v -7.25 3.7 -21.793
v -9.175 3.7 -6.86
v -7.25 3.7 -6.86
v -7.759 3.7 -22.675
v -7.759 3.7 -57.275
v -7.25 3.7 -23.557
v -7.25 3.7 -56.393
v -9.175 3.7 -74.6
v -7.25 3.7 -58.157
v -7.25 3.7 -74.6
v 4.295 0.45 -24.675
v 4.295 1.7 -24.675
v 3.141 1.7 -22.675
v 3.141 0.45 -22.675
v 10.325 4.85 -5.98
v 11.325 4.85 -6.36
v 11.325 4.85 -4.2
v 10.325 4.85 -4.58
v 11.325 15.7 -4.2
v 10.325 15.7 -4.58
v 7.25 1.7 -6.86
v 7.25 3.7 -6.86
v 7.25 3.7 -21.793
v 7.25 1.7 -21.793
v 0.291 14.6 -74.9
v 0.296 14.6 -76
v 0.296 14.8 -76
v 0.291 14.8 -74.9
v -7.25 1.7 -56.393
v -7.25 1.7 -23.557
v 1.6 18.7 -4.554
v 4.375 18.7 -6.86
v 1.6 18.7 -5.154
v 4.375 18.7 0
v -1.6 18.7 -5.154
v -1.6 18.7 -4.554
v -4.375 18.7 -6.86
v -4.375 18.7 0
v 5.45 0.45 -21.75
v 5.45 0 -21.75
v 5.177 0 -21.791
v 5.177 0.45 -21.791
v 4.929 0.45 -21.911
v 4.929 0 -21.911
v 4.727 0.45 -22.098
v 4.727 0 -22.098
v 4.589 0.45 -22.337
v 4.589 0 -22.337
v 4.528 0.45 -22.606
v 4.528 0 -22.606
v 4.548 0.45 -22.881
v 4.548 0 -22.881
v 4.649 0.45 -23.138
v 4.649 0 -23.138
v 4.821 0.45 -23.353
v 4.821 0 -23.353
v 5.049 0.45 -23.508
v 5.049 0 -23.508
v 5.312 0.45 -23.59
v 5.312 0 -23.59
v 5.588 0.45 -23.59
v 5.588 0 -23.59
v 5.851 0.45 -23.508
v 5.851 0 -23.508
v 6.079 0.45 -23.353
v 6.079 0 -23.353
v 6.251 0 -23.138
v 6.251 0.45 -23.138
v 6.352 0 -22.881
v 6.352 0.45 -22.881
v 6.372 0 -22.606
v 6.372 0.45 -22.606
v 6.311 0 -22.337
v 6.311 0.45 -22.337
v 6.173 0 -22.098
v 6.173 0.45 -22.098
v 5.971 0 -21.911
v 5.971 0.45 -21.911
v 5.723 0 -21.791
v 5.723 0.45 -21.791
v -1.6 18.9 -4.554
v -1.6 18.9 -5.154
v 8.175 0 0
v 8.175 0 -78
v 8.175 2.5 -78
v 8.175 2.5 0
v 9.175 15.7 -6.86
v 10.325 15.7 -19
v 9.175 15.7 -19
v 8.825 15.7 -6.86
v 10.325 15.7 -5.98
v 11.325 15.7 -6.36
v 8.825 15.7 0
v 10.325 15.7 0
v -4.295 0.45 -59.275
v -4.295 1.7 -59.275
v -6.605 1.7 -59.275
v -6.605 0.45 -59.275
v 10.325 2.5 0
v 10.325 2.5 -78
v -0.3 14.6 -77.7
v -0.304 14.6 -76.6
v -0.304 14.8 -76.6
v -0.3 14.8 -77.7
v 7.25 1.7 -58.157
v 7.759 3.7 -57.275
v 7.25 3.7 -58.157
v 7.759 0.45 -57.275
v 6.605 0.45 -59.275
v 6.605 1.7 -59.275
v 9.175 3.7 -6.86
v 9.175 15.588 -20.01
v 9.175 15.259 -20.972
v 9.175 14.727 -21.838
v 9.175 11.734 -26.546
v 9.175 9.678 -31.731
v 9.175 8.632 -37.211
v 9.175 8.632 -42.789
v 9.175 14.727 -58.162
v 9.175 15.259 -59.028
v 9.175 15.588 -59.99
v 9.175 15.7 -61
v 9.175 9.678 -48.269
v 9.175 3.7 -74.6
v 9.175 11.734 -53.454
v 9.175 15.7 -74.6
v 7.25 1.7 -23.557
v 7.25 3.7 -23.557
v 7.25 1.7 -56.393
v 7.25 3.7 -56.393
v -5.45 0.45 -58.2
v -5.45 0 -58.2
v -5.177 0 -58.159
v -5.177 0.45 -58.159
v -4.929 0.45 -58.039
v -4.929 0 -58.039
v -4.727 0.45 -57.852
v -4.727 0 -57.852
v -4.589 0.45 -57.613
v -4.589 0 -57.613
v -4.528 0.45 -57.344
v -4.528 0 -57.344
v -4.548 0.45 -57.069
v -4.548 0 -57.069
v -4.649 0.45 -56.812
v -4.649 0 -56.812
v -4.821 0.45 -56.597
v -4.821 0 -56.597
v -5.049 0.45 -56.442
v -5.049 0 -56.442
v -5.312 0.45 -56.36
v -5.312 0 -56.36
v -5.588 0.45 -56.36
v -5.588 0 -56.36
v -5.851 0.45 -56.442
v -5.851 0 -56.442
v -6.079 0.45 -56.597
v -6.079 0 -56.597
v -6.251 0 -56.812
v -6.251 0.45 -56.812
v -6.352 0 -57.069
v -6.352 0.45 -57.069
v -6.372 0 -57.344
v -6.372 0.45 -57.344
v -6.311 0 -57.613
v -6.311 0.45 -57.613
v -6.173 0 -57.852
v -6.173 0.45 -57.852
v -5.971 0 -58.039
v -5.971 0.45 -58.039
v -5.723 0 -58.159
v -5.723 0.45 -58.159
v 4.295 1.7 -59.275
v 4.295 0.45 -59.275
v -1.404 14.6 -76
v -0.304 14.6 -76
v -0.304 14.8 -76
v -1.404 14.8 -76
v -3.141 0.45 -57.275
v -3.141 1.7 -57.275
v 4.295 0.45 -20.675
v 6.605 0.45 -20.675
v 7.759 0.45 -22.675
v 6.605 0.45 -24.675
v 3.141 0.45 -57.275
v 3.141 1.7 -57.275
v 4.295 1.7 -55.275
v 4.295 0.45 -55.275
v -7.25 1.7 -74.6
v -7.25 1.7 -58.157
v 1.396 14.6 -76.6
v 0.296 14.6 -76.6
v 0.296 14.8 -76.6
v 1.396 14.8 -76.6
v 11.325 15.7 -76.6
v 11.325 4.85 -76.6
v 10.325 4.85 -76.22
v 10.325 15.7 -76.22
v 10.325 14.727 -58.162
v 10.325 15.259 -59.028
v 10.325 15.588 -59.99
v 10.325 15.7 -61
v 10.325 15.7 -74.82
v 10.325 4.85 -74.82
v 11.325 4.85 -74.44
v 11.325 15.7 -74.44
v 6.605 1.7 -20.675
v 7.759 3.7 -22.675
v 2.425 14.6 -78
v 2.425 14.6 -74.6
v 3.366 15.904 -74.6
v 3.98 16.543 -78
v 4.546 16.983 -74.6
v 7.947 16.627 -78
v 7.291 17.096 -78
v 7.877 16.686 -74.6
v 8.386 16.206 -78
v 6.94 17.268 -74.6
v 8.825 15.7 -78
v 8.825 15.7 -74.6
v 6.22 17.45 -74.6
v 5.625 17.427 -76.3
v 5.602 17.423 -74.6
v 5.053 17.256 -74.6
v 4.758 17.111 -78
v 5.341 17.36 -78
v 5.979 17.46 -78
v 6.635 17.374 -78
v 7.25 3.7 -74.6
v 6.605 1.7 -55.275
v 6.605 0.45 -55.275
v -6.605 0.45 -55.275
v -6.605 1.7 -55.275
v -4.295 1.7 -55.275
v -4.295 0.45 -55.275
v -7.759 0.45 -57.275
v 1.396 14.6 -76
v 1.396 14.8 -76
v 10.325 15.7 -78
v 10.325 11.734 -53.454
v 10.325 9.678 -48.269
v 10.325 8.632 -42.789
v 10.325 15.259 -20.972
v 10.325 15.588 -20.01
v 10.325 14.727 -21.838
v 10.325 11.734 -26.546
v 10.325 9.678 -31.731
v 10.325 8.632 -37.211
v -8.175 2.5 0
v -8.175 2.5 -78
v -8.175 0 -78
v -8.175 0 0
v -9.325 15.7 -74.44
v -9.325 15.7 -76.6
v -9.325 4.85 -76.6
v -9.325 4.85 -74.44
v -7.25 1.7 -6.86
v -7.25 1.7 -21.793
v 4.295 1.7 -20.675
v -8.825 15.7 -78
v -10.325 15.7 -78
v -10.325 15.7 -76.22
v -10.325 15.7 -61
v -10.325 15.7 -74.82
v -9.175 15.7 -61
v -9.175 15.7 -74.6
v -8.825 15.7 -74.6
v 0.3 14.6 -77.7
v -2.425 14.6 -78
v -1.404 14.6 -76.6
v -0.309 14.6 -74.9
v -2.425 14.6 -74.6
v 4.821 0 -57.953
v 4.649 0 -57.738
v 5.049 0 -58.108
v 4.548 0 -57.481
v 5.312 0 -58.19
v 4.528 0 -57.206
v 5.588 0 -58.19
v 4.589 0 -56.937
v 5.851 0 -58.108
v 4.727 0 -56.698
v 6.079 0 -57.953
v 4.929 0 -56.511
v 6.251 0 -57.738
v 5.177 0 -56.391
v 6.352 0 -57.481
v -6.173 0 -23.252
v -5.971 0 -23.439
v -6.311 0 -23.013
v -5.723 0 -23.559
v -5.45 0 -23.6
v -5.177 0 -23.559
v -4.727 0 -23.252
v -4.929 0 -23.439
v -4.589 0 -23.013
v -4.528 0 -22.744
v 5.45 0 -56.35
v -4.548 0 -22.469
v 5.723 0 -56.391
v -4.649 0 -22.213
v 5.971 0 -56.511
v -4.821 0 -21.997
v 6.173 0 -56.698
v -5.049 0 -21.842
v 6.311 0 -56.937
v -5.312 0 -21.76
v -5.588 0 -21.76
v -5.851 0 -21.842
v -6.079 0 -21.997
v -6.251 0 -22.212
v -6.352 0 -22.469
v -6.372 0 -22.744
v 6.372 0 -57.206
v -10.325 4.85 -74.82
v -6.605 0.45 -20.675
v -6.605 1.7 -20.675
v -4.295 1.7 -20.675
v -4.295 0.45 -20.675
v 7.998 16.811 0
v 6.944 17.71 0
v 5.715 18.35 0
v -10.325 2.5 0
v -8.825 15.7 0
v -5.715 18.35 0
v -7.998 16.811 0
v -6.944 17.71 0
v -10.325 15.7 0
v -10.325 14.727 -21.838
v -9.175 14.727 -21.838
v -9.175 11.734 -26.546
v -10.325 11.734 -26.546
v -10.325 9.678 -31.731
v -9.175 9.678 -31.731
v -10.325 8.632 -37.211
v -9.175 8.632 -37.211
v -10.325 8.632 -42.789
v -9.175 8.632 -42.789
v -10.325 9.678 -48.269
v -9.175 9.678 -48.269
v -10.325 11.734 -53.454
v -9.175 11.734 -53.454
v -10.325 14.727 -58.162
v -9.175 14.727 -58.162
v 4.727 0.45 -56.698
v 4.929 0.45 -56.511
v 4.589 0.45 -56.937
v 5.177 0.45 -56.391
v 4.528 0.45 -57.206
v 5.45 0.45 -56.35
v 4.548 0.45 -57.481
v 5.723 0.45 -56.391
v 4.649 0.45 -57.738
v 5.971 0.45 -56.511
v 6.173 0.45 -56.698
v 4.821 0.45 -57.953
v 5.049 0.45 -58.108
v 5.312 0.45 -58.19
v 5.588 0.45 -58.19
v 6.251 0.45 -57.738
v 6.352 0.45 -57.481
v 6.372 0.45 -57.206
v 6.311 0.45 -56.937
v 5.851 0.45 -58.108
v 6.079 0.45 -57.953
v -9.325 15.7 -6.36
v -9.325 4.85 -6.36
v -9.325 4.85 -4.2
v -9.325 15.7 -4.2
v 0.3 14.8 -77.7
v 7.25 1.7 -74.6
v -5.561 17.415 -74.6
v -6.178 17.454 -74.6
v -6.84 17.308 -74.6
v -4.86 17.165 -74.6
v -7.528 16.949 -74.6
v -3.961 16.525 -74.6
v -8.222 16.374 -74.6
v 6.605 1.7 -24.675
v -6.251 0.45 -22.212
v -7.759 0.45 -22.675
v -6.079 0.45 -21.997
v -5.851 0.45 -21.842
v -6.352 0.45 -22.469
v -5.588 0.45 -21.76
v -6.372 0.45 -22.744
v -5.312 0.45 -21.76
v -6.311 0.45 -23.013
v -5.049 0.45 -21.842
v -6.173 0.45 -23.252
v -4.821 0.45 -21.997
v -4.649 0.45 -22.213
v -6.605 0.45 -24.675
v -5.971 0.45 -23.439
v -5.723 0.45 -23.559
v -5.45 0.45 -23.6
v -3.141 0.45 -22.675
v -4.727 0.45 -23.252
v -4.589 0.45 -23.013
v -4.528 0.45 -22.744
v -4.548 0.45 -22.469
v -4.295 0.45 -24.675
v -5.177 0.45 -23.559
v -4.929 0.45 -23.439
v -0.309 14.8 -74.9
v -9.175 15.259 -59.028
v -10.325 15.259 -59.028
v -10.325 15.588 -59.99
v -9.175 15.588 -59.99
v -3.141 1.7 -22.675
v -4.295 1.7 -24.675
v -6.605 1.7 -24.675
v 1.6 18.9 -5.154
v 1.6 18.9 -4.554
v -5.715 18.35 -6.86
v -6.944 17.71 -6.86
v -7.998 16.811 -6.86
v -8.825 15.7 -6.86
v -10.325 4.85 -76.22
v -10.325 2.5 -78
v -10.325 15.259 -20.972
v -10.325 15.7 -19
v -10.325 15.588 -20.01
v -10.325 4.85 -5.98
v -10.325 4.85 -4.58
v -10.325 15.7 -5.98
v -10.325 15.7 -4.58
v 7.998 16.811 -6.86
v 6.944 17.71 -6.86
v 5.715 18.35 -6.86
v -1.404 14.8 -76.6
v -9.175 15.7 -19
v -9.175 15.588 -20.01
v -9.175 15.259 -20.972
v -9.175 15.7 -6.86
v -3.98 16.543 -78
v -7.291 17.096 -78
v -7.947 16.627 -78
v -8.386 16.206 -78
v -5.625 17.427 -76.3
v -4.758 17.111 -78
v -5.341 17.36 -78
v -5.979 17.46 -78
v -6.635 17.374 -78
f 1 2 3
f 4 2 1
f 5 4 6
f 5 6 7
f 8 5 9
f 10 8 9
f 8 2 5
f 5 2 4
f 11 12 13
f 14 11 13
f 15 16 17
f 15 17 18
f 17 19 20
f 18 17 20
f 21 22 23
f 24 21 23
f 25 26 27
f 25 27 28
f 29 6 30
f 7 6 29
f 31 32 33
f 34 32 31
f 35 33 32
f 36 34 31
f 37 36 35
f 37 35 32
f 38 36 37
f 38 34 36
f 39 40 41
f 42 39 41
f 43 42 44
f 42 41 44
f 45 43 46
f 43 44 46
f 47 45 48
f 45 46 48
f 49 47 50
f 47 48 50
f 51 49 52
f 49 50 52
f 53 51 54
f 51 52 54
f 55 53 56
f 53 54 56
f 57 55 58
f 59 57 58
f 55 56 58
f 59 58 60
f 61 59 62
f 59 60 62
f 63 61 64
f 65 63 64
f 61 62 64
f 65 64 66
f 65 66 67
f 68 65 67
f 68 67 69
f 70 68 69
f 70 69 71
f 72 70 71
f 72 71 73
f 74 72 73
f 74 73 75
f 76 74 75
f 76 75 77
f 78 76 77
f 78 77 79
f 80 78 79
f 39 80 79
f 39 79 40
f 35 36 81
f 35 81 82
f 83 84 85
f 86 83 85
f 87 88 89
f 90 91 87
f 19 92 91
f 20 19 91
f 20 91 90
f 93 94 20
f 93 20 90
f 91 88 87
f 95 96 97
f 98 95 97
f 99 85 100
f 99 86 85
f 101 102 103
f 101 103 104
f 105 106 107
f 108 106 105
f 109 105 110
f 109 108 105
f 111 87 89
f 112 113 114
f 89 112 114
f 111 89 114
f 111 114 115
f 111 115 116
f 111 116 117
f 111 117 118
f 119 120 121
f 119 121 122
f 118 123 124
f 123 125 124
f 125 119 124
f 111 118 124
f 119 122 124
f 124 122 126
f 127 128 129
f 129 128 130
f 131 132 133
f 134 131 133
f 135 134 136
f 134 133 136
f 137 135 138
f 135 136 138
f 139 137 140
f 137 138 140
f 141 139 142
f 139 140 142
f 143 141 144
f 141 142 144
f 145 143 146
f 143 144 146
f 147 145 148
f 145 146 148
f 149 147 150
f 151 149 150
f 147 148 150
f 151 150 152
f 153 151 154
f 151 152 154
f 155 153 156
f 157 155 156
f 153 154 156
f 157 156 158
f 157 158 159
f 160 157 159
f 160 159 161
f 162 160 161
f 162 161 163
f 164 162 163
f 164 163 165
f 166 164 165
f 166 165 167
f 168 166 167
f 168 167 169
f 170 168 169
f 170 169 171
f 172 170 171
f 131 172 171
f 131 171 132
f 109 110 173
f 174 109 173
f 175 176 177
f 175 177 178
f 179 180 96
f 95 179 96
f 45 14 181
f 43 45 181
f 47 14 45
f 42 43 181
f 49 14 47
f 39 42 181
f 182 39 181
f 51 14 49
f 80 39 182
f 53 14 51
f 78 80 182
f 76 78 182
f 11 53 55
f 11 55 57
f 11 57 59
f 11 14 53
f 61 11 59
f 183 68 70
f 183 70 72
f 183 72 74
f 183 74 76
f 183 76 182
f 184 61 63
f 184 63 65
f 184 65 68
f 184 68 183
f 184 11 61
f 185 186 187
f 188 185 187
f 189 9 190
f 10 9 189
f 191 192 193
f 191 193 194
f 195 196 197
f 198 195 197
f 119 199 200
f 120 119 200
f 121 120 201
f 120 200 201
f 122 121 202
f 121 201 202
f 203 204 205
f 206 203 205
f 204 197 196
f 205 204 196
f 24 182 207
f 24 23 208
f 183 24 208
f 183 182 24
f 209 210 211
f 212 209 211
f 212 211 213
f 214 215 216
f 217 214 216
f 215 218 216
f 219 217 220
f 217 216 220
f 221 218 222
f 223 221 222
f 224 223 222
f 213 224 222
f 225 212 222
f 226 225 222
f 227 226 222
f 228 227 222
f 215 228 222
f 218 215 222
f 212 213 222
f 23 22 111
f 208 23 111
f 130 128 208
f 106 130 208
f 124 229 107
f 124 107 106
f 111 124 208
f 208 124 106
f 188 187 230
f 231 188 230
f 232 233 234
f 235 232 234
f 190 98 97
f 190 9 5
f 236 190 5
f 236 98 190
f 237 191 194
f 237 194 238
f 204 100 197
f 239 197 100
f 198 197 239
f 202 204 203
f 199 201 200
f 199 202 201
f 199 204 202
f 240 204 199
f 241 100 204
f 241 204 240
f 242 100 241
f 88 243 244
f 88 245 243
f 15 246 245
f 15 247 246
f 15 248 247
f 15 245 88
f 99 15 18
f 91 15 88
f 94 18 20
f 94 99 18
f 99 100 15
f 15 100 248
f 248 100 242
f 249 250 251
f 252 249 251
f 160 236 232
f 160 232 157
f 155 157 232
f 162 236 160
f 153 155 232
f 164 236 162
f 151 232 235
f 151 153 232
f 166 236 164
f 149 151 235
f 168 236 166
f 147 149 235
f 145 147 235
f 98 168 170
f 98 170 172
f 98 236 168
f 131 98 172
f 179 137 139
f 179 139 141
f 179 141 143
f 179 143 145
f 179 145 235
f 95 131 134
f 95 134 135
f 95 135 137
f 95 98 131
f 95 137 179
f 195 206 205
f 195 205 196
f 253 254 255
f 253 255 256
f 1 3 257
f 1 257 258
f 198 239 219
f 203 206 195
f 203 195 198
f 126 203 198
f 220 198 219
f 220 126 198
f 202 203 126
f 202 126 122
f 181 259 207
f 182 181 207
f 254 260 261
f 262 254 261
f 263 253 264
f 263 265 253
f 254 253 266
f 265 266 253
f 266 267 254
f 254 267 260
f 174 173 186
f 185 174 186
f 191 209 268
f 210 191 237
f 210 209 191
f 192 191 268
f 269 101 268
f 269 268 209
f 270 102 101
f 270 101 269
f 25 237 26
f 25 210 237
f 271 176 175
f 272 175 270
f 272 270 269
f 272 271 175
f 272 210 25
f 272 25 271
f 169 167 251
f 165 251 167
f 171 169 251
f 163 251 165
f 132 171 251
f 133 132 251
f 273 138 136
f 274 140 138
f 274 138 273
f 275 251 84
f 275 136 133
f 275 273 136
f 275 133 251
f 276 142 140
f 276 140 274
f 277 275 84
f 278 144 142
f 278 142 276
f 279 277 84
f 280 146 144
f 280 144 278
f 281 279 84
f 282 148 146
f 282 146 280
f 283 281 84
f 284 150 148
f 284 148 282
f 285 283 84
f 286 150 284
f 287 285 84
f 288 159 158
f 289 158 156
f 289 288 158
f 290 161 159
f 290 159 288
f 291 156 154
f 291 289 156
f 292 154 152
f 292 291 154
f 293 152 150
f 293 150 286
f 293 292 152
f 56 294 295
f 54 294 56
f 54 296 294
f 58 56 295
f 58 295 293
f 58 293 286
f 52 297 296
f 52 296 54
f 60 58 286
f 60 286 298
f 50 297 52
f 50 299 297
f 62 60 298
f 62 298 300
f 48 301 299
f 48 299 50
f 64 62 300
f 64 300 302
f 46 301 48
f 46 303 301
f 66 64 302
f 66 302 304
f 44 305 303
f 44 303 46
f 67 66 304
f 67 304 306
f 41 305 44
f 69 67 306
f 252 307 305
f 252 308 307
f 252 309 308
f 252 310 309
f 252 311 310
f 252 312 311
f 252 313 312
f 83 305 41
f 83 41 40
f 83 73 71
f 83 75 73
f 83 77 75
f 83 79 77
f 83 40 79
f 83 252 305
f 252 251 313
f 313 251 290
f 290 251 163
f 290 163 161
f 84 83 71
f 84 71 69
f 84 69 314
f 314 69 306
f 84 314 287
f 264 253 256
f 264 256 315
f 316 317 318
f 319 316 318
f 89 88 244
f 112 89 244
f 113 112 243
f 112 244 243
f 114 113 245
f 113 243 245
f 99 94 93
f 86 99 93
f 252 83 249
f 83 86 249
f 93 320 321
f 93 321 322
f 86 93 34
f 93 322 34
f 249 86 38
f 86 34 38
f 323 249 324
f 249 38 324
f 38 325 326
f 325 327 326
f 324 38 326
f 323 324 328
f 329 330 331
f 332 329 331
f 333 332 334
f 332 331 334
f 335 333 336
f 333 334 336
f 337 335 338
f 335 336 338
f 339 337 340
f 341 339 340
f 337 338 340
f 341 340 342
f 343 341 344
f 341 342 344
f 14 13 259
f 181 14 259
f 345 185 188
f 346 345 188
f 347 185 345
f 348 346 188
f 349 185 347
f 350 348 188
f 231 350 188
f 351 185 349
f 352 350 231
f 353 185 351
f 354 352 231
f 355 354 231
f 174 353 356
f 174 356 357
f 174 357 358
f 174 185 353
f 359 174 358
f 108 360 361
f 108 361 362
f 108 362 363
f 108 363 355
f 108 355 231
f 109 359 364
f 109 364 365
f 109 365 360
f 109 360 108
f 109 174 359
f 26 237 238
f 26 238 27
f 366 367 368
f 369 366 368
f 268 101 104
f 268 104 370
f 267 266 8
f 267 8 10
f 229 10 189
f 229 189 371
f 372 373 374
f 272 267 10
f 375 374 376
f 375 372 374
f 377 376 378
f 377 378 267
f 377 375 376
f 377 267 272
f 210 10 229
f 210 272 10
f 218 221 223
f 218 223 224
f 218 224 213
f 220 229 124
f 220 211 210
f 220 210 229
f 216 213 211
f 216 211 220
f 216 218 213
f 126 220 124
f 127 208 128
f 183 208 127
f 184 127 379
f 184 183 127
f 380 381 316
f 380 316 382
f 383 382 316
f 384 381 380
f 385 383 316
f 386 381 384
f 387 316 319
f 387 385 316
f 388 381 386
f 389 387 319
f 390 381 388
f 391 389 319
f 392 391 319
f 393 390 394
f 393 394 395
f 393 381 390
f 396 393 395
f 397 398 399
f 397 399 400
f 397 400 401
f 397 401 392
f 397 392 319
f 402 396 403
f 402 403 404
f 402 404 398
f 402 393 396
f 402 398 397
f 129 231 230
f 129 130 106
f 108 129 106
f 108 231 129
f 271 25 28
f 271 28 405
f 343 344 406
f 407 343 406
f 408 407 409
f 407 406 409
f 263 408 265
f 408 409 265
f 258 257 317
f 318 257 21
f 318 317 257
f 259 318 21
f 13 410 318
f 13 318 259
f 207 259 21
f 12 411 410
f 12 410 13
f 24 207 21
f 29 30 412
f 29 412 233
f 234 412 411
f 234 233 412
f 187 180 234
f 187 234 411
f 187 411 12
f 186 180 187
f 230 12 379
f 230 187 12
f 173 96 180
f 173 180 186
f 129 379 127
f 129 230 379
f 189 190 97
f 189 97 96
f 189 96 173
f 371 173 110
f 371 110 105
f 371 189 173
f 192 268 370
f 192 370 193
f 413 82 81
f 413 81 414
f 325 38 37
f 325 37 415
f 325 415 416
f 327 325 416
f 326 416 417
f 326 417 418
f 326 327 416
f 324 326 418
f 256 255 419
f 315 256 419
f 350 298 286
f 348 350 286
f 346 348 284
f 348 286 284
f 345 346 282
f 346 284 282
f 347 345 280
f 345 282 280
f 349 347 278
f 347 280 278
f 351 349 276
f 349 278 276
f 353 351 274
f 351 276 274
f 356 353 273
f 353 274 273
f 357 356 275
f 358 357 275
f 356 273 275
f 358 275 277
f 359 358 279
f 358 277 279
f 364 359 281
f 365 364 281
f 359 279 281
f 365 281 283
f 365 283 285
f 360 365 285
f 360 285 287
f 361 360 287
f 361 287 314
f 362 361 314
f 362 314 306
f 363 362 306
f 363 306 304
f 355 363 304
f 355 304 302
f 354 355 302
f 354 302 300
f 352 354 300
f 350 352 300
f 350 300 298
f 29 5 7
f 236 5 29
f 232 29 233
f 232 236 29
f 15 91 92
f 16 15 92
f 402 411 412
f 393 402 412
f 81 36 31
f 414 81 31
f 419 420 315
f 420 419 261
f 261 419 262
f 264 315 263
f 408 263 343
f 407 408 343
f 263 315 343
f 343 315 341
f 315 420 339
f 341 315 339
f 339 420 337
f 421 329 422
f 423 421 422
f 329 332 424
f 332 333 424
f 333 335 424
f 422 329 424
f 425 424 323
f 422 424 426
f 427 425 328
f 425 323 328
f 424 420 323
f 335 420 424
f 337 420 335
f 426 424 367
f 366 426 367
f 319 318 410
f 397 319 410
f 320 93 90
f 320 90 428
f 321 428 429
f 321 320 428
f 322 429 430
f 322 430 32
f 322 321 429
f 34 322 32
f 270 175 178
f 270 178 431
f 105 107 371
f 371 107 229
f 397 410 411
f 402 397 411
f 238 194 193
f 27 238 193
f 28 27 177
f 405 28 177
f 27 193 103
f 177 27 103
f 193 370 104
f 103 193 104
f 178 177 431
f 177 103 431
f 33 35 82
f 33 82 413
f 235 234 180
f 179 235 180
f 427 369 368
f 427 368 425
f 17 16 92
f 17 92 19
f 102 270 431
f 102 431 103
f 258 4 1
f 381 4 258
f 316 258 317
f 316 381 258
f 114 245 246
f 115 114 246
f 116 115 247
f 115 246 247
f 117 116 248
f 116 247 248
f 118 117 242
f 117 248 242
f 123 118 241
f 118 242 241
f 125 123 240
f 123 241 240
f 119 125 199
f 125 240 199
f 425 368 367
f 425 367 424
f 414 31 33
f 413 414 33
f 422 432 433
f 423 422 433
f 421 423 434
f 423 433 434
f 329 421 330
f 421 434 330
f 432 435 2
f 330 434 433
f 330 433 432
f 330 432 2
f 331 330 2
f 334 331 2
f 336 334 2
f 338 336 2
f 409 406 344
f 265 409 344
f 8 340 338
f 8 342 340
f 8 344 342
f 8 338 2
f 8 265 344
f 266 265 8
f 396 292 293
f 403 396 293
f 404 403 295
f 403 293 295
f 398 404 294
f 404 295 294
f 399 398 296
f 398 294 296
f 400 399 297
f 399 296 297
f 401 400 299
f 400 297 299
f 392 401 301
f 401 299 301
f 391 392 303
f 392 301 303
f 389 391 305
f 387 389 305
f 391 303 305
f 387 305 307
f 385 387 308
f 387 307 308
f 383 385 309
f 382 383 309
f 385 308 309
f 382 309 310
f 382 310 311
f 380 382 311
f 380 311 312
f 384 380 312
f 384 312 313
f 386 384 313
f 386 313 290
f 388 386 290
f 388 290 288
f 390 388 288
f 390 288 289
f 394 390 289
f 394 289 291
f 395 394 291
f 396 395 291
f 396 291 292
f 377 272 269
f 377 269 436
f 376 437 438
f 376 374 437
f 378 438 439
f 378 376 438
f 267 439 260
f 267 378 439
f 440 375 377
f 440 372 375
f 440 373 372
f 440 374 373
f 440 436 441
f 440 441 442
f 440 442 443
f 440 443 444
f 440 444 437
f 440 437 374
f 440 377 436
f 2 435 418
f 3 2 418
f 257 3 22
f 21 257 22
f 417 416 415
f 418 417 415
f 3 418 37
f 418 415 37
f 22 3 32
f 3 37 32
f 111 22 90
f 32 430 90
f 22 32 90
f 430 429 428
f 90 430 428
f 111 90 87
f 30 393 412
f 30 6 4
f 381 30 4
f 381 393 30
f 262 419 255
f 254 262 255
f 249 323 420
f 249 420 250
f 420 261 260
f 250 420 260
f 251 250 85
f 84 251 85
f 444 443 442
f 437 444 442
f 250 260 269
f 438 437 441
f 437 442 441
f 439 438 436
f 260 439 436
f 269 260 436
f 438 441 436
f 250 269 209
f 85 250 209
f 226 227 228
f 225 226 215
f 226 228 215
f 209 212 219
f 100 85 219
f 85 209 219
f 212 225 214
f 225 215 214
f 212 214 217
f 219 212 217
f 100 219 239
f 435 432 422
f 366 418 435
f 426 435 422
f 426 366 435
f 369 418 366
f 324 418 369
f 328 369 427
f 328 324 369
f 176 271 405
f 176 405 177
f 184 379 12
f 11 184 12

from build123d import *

# Parameters (mm, degrees)
EXTRUDE1_DEPTH       = 40
EXTRUDE2_DEPTH       = 6.86
EXTRUDE3_DEPTH       = 38
SKETCH5_W            = 18.35
SKETCH5_H            = 67.74
EXTRUDE4_DEPTH       = 81.231512798
EXTRUDE4_DEPTH_BACK  = 12
SKETCH6_W            = 14.5
SKETCH6_H            = 67.74
EXTRUDE5_DEPTH       = 2
EXTRUDE6_DEPTH       = 83.825796222
EXTRUDE7_DEPTH       = 10.85
EXTRUDE8_DEPTH       = 10.85
SKETCH10_R           = 0.925
EXTRUDE9_DEPTH       = 82.005837077
EXTRUDE10_DEPTH      = 81.630364259
EXTRUDE10_DEPTH_BACK = 1.25
SKETCH12_W           = 3.2
SKETCH12_H           = 0.6
EXTRUDE11_DEPTH      = 0.2
EXTRUDE12_DEPTH      = 0.2


with BuildPart() as part:
    # Sketch1 → Extrude1 (new body)
    with BuildSketch(Plane.XY):
        Polygon((8.175, 0), (-8.175, 0), (-8.175, 2.5), (-10.325, 2.5), (-10.325, 15.7), (10.325, 15.7), (10.325, 2.5), (8.175, 2.5), align=None)
    extrude(amount=-EXTRUDE1_DEPTH)

    # Sketch2 → Extrude2 (add)
    with BuildSketch(Plane.XY):
        with BuildLine():
            Line((-8.825, 15.7), (8.825, 15.7))
            ThreePointArc((8.825, 15.7), (6.943835072, 17.710022023), (4.375, 18.7))
            Line((4.375, 18.7), (-4.375, 18.7))
            ThreePointArc((-4.375, 18.7), (-6.943835072, 17.710022023), (-8.825, 15.7))
        make_face()
    extrude(amount=-EXTRUDE2_DEPTH)

    # Sketch4 → Extrude3 (add)
    with BuildSketch(Plane(origin=(0, 0, -40), x_dir=(-1, 0, 0), z_dir=(0, 0, -1))):
        with BuildLine():
            Line((-10.325, 15.7), (-8.825, 15.7))
            add(Edge.make_bspline(
                [(-2.425, 14.6), (-5.625, 19.703568586), (-8.825, 15.7)],
                knots=[0, 0, 0, 1, 1, 1], degree=2))
            Line((-2.425, 14.6), (2.425, 14.6))
            add(Edge.make_bspline(
                [(2.425, 14.6), (5.625, 19.703568586), (8.825, 15.7)],
                knots=[0, 0, 0, 1, 1, 1], degree=2))
            Line((8.825, 15.7), (10.325, 15.7))
            Line((10.325, 15.7), (10.325, 2.5))
            Line((10.325, 2.5), (8.175, 2.5))
            Line((8.175, 2.5), (8.175, 0))
            Line((8.175, 0), (-8.175, 0))
            Line((-8.175, 0), (-8.175, 2.5))
            Line((-8.175, 2.5), (-10.325, 2.5))
            Line((-10.325, 2.5), (-10.325, 15.7))
        make_face()
    extrude(amount=EXTRUDE3_DEPTH)

    # Sketch5 → Extrude4 (cut, two sides)
    with BuildSketch(Plane(origin=(0, 15.7, 0), x_dir=(1, 0, 0), z_dir=(0, 1, 0))) as extrude4_sk:
        with Locations((0, 40.73)):
            Rectangle(SKETCH5_W, SKETCH5_H)
    extrude(amount=EXTRUDE4_DEPTH, mode=Mode.SUBTRACT)
    extrude(extrude4_sk.sketch, amount=-EXTRUDE4_DEPTH_BACK, mode=Mode.SUBTRACT)

    # Sketch6 → Extrude5 (cut)
    with BuildSketch(Plane(origin=(0, 3.7, 0), x_dir=(1, 0, 0), z_dir=(0, 1, 0))):
        with Locations((0, 40.73)):
            Rectangle(SKETCH6_W, SKETCH6_H)
    extrude(amount=-EXTRUDE5_DEPTH, mode=Mode.SUBTRACT)

    # Sketch7 → Extrude6 (cut, through all)
    with BuildSketch(Plane(origin=(10.325, 0, 0), x_dir=(0, 0, -1), z_dir=(1, 0, 0))):
        with BuildLine():
            Line((12.066317198, 15.7), (19, 15.7))
            ThreePointArc((19, 15.7), (20.5, 15.45), (21.837837838, 14.727027027))
            ThreePointArc((21.837837838, 14.727027027), (40, 8.5), (58.162162162, 14.727027027))
            ThreePointArc((58.162162162, 14.727027027), (59.5, 15.45), (61, 15.7))
            Line((61, 15.7), (67.933682802, 15.7))
            Line((67.933682802, 15.7), (67.933682802, 19.991069183))
            Line((67.933682802, 19.991069183), (12.066317198, 19.991069183))
            Line((12.066317198, 19.991069183), (12.066317198, 15.7))
        make_face()
    extrude(amount=-EXTRUDE6_DEPTH, mode=Mode.SUBTRACT)

    # Sketch8 → Extrude7 (add)
    with BuildSketch(Plane(origin=(0, 15.7, 0), x_dir=(1, 0, 0), z_dir=(0, 1, 0))):
        Polygon((10.325, 4.58), (10.325, 5.98), (11.325, 6.36), (11.325, 4.2), align=None)
        Polygon((11.325, 76.6), (10.325, 76.22), (10.325, 74.82), (11.325, 74.44), align=None)
    extrude(amount=-EXTRUDE7_DEPTH)

    # Sketch9 → Extrude8 (cut)
    with BuildSketch(Plane(origin=(0, 15.7, 0), x_dir=(1, 0, 0), z_dir=(0, 1, 0))):
        Polygon((-10.325000262, 76.22), (-9.325000262, 76.6), (-9.325000262, 74.44), (-10.325000468, 74.82), align=None)
        Polygon((-10.325000787, 5.98), (-9.325000787, 6.36), (-9.325000787, 4.2), (-10.325000603, 4.58), align=None)
    extrude(amount=-EXTRUDE8_DEPTH, mode=Mode.SUBTRACT)

    # Sketch10 → Extrude9 (cut, through all)
    with BuildSketch(Plane.XZ):
        with Locations(Location((-5.45, -22.675, 0), (0, 0, 270))):
            Circle(SKETCH10_R)
        with Locations(Location((-5.45, -57.275, 0), (0, 0, 270))):
            Circle(SKETCH10_R)
        with Locations(Location((5.45, -57.275, 0), (0, 0, 90))):
            Circle(SKETCH10_R)
        with Locations(Location((5.45, -22.675, 0), (0, 0, 90))):
            Circle(SKETCH10_R)
    extrude(amount=-EXTRUDE9_DEPTH, mode=Mode.SUBTRACT)

    # Sketch11 → Extrude10 (cut, two sides)
    with BuildSketch(Plane(origin=(0, 1.7, 0), x_dir=(1, 0, 0), z_dir=(0, 1, 0))) as extrude10_sk:
        Polygon((-3.140598923, 57.275), (-4.295299462, 59.275), (-6.604700538, 59.275), (-7.759401077, 57.275), (-6.604700538, 55.275), (-4.295299462, 55.275), align=None)
        Polygon((3.140598923, 57.275), (4.295299462, 55.275), (6.604700538, 55.275), (7.759401077, 57.275), (6.604700538, 59.275), (4.295299462, 59.275), align=None)
        Polygon((-3.140598923, 22.675), (-4.295299462, 24.675), (-6.604700538, 24.675), (-7.759401077, 22.675), (-6.604700538, 20.675), (-4.295299462, 20.675), align=None)
        Polygon((3.140598923, 22.675), (4.295299462, 20.675), (6.604700538, 20.675), (7.759401077, 22.675), (6.604700538, 24.675), (4.295299462, 24.675), align=None)
    extrude(amount=EXTRUDE10_DEPTH, mode=Mode.SUBTRACT)
    extrude(extrude10_sk.sketch, amount=-EXTRUDE10_DEPTH_BACK, mode=Mode.SUBTRACT)

    # Sketch12 → Extrude11 (add)
    with BuildSketch(Plane(origin=(0, 18.7, 0), x_dir=(1, 0, 0), z_dir=(0, 1, 0))):
        with Locations((0, 4.853640731)):
            Rectangle(SKETCH12_W, SKETCH12_H)
    extrude(amount=EXTRUDE11_DEPTH)

    # Sketch13 → Extrude12 (add)
    with BuildSketch(Plane(origin=(0, 14.6, 0), x_dir=(1, 0, 0), z_dir=(0, 1, 0))):
        Polygon((-0.3, 77.7), (0.3, 77.7), (0.295752896, 76.599999935), (1.395761159, 76.599999935), (1.395761159, 75.999999935), (0.295752896, 75.999999935), (0.291472262, 74.9), (-0.308527738, 74.9), (-0.304247104, 75.999999935), (-1.404255368, 75.999999935), (-1.404255368, 76.599999935), (-0.304247104, 76.599999935), align=None)
    extrude(amount=EXTRUDE12_DEPTH)


solid = part.part
